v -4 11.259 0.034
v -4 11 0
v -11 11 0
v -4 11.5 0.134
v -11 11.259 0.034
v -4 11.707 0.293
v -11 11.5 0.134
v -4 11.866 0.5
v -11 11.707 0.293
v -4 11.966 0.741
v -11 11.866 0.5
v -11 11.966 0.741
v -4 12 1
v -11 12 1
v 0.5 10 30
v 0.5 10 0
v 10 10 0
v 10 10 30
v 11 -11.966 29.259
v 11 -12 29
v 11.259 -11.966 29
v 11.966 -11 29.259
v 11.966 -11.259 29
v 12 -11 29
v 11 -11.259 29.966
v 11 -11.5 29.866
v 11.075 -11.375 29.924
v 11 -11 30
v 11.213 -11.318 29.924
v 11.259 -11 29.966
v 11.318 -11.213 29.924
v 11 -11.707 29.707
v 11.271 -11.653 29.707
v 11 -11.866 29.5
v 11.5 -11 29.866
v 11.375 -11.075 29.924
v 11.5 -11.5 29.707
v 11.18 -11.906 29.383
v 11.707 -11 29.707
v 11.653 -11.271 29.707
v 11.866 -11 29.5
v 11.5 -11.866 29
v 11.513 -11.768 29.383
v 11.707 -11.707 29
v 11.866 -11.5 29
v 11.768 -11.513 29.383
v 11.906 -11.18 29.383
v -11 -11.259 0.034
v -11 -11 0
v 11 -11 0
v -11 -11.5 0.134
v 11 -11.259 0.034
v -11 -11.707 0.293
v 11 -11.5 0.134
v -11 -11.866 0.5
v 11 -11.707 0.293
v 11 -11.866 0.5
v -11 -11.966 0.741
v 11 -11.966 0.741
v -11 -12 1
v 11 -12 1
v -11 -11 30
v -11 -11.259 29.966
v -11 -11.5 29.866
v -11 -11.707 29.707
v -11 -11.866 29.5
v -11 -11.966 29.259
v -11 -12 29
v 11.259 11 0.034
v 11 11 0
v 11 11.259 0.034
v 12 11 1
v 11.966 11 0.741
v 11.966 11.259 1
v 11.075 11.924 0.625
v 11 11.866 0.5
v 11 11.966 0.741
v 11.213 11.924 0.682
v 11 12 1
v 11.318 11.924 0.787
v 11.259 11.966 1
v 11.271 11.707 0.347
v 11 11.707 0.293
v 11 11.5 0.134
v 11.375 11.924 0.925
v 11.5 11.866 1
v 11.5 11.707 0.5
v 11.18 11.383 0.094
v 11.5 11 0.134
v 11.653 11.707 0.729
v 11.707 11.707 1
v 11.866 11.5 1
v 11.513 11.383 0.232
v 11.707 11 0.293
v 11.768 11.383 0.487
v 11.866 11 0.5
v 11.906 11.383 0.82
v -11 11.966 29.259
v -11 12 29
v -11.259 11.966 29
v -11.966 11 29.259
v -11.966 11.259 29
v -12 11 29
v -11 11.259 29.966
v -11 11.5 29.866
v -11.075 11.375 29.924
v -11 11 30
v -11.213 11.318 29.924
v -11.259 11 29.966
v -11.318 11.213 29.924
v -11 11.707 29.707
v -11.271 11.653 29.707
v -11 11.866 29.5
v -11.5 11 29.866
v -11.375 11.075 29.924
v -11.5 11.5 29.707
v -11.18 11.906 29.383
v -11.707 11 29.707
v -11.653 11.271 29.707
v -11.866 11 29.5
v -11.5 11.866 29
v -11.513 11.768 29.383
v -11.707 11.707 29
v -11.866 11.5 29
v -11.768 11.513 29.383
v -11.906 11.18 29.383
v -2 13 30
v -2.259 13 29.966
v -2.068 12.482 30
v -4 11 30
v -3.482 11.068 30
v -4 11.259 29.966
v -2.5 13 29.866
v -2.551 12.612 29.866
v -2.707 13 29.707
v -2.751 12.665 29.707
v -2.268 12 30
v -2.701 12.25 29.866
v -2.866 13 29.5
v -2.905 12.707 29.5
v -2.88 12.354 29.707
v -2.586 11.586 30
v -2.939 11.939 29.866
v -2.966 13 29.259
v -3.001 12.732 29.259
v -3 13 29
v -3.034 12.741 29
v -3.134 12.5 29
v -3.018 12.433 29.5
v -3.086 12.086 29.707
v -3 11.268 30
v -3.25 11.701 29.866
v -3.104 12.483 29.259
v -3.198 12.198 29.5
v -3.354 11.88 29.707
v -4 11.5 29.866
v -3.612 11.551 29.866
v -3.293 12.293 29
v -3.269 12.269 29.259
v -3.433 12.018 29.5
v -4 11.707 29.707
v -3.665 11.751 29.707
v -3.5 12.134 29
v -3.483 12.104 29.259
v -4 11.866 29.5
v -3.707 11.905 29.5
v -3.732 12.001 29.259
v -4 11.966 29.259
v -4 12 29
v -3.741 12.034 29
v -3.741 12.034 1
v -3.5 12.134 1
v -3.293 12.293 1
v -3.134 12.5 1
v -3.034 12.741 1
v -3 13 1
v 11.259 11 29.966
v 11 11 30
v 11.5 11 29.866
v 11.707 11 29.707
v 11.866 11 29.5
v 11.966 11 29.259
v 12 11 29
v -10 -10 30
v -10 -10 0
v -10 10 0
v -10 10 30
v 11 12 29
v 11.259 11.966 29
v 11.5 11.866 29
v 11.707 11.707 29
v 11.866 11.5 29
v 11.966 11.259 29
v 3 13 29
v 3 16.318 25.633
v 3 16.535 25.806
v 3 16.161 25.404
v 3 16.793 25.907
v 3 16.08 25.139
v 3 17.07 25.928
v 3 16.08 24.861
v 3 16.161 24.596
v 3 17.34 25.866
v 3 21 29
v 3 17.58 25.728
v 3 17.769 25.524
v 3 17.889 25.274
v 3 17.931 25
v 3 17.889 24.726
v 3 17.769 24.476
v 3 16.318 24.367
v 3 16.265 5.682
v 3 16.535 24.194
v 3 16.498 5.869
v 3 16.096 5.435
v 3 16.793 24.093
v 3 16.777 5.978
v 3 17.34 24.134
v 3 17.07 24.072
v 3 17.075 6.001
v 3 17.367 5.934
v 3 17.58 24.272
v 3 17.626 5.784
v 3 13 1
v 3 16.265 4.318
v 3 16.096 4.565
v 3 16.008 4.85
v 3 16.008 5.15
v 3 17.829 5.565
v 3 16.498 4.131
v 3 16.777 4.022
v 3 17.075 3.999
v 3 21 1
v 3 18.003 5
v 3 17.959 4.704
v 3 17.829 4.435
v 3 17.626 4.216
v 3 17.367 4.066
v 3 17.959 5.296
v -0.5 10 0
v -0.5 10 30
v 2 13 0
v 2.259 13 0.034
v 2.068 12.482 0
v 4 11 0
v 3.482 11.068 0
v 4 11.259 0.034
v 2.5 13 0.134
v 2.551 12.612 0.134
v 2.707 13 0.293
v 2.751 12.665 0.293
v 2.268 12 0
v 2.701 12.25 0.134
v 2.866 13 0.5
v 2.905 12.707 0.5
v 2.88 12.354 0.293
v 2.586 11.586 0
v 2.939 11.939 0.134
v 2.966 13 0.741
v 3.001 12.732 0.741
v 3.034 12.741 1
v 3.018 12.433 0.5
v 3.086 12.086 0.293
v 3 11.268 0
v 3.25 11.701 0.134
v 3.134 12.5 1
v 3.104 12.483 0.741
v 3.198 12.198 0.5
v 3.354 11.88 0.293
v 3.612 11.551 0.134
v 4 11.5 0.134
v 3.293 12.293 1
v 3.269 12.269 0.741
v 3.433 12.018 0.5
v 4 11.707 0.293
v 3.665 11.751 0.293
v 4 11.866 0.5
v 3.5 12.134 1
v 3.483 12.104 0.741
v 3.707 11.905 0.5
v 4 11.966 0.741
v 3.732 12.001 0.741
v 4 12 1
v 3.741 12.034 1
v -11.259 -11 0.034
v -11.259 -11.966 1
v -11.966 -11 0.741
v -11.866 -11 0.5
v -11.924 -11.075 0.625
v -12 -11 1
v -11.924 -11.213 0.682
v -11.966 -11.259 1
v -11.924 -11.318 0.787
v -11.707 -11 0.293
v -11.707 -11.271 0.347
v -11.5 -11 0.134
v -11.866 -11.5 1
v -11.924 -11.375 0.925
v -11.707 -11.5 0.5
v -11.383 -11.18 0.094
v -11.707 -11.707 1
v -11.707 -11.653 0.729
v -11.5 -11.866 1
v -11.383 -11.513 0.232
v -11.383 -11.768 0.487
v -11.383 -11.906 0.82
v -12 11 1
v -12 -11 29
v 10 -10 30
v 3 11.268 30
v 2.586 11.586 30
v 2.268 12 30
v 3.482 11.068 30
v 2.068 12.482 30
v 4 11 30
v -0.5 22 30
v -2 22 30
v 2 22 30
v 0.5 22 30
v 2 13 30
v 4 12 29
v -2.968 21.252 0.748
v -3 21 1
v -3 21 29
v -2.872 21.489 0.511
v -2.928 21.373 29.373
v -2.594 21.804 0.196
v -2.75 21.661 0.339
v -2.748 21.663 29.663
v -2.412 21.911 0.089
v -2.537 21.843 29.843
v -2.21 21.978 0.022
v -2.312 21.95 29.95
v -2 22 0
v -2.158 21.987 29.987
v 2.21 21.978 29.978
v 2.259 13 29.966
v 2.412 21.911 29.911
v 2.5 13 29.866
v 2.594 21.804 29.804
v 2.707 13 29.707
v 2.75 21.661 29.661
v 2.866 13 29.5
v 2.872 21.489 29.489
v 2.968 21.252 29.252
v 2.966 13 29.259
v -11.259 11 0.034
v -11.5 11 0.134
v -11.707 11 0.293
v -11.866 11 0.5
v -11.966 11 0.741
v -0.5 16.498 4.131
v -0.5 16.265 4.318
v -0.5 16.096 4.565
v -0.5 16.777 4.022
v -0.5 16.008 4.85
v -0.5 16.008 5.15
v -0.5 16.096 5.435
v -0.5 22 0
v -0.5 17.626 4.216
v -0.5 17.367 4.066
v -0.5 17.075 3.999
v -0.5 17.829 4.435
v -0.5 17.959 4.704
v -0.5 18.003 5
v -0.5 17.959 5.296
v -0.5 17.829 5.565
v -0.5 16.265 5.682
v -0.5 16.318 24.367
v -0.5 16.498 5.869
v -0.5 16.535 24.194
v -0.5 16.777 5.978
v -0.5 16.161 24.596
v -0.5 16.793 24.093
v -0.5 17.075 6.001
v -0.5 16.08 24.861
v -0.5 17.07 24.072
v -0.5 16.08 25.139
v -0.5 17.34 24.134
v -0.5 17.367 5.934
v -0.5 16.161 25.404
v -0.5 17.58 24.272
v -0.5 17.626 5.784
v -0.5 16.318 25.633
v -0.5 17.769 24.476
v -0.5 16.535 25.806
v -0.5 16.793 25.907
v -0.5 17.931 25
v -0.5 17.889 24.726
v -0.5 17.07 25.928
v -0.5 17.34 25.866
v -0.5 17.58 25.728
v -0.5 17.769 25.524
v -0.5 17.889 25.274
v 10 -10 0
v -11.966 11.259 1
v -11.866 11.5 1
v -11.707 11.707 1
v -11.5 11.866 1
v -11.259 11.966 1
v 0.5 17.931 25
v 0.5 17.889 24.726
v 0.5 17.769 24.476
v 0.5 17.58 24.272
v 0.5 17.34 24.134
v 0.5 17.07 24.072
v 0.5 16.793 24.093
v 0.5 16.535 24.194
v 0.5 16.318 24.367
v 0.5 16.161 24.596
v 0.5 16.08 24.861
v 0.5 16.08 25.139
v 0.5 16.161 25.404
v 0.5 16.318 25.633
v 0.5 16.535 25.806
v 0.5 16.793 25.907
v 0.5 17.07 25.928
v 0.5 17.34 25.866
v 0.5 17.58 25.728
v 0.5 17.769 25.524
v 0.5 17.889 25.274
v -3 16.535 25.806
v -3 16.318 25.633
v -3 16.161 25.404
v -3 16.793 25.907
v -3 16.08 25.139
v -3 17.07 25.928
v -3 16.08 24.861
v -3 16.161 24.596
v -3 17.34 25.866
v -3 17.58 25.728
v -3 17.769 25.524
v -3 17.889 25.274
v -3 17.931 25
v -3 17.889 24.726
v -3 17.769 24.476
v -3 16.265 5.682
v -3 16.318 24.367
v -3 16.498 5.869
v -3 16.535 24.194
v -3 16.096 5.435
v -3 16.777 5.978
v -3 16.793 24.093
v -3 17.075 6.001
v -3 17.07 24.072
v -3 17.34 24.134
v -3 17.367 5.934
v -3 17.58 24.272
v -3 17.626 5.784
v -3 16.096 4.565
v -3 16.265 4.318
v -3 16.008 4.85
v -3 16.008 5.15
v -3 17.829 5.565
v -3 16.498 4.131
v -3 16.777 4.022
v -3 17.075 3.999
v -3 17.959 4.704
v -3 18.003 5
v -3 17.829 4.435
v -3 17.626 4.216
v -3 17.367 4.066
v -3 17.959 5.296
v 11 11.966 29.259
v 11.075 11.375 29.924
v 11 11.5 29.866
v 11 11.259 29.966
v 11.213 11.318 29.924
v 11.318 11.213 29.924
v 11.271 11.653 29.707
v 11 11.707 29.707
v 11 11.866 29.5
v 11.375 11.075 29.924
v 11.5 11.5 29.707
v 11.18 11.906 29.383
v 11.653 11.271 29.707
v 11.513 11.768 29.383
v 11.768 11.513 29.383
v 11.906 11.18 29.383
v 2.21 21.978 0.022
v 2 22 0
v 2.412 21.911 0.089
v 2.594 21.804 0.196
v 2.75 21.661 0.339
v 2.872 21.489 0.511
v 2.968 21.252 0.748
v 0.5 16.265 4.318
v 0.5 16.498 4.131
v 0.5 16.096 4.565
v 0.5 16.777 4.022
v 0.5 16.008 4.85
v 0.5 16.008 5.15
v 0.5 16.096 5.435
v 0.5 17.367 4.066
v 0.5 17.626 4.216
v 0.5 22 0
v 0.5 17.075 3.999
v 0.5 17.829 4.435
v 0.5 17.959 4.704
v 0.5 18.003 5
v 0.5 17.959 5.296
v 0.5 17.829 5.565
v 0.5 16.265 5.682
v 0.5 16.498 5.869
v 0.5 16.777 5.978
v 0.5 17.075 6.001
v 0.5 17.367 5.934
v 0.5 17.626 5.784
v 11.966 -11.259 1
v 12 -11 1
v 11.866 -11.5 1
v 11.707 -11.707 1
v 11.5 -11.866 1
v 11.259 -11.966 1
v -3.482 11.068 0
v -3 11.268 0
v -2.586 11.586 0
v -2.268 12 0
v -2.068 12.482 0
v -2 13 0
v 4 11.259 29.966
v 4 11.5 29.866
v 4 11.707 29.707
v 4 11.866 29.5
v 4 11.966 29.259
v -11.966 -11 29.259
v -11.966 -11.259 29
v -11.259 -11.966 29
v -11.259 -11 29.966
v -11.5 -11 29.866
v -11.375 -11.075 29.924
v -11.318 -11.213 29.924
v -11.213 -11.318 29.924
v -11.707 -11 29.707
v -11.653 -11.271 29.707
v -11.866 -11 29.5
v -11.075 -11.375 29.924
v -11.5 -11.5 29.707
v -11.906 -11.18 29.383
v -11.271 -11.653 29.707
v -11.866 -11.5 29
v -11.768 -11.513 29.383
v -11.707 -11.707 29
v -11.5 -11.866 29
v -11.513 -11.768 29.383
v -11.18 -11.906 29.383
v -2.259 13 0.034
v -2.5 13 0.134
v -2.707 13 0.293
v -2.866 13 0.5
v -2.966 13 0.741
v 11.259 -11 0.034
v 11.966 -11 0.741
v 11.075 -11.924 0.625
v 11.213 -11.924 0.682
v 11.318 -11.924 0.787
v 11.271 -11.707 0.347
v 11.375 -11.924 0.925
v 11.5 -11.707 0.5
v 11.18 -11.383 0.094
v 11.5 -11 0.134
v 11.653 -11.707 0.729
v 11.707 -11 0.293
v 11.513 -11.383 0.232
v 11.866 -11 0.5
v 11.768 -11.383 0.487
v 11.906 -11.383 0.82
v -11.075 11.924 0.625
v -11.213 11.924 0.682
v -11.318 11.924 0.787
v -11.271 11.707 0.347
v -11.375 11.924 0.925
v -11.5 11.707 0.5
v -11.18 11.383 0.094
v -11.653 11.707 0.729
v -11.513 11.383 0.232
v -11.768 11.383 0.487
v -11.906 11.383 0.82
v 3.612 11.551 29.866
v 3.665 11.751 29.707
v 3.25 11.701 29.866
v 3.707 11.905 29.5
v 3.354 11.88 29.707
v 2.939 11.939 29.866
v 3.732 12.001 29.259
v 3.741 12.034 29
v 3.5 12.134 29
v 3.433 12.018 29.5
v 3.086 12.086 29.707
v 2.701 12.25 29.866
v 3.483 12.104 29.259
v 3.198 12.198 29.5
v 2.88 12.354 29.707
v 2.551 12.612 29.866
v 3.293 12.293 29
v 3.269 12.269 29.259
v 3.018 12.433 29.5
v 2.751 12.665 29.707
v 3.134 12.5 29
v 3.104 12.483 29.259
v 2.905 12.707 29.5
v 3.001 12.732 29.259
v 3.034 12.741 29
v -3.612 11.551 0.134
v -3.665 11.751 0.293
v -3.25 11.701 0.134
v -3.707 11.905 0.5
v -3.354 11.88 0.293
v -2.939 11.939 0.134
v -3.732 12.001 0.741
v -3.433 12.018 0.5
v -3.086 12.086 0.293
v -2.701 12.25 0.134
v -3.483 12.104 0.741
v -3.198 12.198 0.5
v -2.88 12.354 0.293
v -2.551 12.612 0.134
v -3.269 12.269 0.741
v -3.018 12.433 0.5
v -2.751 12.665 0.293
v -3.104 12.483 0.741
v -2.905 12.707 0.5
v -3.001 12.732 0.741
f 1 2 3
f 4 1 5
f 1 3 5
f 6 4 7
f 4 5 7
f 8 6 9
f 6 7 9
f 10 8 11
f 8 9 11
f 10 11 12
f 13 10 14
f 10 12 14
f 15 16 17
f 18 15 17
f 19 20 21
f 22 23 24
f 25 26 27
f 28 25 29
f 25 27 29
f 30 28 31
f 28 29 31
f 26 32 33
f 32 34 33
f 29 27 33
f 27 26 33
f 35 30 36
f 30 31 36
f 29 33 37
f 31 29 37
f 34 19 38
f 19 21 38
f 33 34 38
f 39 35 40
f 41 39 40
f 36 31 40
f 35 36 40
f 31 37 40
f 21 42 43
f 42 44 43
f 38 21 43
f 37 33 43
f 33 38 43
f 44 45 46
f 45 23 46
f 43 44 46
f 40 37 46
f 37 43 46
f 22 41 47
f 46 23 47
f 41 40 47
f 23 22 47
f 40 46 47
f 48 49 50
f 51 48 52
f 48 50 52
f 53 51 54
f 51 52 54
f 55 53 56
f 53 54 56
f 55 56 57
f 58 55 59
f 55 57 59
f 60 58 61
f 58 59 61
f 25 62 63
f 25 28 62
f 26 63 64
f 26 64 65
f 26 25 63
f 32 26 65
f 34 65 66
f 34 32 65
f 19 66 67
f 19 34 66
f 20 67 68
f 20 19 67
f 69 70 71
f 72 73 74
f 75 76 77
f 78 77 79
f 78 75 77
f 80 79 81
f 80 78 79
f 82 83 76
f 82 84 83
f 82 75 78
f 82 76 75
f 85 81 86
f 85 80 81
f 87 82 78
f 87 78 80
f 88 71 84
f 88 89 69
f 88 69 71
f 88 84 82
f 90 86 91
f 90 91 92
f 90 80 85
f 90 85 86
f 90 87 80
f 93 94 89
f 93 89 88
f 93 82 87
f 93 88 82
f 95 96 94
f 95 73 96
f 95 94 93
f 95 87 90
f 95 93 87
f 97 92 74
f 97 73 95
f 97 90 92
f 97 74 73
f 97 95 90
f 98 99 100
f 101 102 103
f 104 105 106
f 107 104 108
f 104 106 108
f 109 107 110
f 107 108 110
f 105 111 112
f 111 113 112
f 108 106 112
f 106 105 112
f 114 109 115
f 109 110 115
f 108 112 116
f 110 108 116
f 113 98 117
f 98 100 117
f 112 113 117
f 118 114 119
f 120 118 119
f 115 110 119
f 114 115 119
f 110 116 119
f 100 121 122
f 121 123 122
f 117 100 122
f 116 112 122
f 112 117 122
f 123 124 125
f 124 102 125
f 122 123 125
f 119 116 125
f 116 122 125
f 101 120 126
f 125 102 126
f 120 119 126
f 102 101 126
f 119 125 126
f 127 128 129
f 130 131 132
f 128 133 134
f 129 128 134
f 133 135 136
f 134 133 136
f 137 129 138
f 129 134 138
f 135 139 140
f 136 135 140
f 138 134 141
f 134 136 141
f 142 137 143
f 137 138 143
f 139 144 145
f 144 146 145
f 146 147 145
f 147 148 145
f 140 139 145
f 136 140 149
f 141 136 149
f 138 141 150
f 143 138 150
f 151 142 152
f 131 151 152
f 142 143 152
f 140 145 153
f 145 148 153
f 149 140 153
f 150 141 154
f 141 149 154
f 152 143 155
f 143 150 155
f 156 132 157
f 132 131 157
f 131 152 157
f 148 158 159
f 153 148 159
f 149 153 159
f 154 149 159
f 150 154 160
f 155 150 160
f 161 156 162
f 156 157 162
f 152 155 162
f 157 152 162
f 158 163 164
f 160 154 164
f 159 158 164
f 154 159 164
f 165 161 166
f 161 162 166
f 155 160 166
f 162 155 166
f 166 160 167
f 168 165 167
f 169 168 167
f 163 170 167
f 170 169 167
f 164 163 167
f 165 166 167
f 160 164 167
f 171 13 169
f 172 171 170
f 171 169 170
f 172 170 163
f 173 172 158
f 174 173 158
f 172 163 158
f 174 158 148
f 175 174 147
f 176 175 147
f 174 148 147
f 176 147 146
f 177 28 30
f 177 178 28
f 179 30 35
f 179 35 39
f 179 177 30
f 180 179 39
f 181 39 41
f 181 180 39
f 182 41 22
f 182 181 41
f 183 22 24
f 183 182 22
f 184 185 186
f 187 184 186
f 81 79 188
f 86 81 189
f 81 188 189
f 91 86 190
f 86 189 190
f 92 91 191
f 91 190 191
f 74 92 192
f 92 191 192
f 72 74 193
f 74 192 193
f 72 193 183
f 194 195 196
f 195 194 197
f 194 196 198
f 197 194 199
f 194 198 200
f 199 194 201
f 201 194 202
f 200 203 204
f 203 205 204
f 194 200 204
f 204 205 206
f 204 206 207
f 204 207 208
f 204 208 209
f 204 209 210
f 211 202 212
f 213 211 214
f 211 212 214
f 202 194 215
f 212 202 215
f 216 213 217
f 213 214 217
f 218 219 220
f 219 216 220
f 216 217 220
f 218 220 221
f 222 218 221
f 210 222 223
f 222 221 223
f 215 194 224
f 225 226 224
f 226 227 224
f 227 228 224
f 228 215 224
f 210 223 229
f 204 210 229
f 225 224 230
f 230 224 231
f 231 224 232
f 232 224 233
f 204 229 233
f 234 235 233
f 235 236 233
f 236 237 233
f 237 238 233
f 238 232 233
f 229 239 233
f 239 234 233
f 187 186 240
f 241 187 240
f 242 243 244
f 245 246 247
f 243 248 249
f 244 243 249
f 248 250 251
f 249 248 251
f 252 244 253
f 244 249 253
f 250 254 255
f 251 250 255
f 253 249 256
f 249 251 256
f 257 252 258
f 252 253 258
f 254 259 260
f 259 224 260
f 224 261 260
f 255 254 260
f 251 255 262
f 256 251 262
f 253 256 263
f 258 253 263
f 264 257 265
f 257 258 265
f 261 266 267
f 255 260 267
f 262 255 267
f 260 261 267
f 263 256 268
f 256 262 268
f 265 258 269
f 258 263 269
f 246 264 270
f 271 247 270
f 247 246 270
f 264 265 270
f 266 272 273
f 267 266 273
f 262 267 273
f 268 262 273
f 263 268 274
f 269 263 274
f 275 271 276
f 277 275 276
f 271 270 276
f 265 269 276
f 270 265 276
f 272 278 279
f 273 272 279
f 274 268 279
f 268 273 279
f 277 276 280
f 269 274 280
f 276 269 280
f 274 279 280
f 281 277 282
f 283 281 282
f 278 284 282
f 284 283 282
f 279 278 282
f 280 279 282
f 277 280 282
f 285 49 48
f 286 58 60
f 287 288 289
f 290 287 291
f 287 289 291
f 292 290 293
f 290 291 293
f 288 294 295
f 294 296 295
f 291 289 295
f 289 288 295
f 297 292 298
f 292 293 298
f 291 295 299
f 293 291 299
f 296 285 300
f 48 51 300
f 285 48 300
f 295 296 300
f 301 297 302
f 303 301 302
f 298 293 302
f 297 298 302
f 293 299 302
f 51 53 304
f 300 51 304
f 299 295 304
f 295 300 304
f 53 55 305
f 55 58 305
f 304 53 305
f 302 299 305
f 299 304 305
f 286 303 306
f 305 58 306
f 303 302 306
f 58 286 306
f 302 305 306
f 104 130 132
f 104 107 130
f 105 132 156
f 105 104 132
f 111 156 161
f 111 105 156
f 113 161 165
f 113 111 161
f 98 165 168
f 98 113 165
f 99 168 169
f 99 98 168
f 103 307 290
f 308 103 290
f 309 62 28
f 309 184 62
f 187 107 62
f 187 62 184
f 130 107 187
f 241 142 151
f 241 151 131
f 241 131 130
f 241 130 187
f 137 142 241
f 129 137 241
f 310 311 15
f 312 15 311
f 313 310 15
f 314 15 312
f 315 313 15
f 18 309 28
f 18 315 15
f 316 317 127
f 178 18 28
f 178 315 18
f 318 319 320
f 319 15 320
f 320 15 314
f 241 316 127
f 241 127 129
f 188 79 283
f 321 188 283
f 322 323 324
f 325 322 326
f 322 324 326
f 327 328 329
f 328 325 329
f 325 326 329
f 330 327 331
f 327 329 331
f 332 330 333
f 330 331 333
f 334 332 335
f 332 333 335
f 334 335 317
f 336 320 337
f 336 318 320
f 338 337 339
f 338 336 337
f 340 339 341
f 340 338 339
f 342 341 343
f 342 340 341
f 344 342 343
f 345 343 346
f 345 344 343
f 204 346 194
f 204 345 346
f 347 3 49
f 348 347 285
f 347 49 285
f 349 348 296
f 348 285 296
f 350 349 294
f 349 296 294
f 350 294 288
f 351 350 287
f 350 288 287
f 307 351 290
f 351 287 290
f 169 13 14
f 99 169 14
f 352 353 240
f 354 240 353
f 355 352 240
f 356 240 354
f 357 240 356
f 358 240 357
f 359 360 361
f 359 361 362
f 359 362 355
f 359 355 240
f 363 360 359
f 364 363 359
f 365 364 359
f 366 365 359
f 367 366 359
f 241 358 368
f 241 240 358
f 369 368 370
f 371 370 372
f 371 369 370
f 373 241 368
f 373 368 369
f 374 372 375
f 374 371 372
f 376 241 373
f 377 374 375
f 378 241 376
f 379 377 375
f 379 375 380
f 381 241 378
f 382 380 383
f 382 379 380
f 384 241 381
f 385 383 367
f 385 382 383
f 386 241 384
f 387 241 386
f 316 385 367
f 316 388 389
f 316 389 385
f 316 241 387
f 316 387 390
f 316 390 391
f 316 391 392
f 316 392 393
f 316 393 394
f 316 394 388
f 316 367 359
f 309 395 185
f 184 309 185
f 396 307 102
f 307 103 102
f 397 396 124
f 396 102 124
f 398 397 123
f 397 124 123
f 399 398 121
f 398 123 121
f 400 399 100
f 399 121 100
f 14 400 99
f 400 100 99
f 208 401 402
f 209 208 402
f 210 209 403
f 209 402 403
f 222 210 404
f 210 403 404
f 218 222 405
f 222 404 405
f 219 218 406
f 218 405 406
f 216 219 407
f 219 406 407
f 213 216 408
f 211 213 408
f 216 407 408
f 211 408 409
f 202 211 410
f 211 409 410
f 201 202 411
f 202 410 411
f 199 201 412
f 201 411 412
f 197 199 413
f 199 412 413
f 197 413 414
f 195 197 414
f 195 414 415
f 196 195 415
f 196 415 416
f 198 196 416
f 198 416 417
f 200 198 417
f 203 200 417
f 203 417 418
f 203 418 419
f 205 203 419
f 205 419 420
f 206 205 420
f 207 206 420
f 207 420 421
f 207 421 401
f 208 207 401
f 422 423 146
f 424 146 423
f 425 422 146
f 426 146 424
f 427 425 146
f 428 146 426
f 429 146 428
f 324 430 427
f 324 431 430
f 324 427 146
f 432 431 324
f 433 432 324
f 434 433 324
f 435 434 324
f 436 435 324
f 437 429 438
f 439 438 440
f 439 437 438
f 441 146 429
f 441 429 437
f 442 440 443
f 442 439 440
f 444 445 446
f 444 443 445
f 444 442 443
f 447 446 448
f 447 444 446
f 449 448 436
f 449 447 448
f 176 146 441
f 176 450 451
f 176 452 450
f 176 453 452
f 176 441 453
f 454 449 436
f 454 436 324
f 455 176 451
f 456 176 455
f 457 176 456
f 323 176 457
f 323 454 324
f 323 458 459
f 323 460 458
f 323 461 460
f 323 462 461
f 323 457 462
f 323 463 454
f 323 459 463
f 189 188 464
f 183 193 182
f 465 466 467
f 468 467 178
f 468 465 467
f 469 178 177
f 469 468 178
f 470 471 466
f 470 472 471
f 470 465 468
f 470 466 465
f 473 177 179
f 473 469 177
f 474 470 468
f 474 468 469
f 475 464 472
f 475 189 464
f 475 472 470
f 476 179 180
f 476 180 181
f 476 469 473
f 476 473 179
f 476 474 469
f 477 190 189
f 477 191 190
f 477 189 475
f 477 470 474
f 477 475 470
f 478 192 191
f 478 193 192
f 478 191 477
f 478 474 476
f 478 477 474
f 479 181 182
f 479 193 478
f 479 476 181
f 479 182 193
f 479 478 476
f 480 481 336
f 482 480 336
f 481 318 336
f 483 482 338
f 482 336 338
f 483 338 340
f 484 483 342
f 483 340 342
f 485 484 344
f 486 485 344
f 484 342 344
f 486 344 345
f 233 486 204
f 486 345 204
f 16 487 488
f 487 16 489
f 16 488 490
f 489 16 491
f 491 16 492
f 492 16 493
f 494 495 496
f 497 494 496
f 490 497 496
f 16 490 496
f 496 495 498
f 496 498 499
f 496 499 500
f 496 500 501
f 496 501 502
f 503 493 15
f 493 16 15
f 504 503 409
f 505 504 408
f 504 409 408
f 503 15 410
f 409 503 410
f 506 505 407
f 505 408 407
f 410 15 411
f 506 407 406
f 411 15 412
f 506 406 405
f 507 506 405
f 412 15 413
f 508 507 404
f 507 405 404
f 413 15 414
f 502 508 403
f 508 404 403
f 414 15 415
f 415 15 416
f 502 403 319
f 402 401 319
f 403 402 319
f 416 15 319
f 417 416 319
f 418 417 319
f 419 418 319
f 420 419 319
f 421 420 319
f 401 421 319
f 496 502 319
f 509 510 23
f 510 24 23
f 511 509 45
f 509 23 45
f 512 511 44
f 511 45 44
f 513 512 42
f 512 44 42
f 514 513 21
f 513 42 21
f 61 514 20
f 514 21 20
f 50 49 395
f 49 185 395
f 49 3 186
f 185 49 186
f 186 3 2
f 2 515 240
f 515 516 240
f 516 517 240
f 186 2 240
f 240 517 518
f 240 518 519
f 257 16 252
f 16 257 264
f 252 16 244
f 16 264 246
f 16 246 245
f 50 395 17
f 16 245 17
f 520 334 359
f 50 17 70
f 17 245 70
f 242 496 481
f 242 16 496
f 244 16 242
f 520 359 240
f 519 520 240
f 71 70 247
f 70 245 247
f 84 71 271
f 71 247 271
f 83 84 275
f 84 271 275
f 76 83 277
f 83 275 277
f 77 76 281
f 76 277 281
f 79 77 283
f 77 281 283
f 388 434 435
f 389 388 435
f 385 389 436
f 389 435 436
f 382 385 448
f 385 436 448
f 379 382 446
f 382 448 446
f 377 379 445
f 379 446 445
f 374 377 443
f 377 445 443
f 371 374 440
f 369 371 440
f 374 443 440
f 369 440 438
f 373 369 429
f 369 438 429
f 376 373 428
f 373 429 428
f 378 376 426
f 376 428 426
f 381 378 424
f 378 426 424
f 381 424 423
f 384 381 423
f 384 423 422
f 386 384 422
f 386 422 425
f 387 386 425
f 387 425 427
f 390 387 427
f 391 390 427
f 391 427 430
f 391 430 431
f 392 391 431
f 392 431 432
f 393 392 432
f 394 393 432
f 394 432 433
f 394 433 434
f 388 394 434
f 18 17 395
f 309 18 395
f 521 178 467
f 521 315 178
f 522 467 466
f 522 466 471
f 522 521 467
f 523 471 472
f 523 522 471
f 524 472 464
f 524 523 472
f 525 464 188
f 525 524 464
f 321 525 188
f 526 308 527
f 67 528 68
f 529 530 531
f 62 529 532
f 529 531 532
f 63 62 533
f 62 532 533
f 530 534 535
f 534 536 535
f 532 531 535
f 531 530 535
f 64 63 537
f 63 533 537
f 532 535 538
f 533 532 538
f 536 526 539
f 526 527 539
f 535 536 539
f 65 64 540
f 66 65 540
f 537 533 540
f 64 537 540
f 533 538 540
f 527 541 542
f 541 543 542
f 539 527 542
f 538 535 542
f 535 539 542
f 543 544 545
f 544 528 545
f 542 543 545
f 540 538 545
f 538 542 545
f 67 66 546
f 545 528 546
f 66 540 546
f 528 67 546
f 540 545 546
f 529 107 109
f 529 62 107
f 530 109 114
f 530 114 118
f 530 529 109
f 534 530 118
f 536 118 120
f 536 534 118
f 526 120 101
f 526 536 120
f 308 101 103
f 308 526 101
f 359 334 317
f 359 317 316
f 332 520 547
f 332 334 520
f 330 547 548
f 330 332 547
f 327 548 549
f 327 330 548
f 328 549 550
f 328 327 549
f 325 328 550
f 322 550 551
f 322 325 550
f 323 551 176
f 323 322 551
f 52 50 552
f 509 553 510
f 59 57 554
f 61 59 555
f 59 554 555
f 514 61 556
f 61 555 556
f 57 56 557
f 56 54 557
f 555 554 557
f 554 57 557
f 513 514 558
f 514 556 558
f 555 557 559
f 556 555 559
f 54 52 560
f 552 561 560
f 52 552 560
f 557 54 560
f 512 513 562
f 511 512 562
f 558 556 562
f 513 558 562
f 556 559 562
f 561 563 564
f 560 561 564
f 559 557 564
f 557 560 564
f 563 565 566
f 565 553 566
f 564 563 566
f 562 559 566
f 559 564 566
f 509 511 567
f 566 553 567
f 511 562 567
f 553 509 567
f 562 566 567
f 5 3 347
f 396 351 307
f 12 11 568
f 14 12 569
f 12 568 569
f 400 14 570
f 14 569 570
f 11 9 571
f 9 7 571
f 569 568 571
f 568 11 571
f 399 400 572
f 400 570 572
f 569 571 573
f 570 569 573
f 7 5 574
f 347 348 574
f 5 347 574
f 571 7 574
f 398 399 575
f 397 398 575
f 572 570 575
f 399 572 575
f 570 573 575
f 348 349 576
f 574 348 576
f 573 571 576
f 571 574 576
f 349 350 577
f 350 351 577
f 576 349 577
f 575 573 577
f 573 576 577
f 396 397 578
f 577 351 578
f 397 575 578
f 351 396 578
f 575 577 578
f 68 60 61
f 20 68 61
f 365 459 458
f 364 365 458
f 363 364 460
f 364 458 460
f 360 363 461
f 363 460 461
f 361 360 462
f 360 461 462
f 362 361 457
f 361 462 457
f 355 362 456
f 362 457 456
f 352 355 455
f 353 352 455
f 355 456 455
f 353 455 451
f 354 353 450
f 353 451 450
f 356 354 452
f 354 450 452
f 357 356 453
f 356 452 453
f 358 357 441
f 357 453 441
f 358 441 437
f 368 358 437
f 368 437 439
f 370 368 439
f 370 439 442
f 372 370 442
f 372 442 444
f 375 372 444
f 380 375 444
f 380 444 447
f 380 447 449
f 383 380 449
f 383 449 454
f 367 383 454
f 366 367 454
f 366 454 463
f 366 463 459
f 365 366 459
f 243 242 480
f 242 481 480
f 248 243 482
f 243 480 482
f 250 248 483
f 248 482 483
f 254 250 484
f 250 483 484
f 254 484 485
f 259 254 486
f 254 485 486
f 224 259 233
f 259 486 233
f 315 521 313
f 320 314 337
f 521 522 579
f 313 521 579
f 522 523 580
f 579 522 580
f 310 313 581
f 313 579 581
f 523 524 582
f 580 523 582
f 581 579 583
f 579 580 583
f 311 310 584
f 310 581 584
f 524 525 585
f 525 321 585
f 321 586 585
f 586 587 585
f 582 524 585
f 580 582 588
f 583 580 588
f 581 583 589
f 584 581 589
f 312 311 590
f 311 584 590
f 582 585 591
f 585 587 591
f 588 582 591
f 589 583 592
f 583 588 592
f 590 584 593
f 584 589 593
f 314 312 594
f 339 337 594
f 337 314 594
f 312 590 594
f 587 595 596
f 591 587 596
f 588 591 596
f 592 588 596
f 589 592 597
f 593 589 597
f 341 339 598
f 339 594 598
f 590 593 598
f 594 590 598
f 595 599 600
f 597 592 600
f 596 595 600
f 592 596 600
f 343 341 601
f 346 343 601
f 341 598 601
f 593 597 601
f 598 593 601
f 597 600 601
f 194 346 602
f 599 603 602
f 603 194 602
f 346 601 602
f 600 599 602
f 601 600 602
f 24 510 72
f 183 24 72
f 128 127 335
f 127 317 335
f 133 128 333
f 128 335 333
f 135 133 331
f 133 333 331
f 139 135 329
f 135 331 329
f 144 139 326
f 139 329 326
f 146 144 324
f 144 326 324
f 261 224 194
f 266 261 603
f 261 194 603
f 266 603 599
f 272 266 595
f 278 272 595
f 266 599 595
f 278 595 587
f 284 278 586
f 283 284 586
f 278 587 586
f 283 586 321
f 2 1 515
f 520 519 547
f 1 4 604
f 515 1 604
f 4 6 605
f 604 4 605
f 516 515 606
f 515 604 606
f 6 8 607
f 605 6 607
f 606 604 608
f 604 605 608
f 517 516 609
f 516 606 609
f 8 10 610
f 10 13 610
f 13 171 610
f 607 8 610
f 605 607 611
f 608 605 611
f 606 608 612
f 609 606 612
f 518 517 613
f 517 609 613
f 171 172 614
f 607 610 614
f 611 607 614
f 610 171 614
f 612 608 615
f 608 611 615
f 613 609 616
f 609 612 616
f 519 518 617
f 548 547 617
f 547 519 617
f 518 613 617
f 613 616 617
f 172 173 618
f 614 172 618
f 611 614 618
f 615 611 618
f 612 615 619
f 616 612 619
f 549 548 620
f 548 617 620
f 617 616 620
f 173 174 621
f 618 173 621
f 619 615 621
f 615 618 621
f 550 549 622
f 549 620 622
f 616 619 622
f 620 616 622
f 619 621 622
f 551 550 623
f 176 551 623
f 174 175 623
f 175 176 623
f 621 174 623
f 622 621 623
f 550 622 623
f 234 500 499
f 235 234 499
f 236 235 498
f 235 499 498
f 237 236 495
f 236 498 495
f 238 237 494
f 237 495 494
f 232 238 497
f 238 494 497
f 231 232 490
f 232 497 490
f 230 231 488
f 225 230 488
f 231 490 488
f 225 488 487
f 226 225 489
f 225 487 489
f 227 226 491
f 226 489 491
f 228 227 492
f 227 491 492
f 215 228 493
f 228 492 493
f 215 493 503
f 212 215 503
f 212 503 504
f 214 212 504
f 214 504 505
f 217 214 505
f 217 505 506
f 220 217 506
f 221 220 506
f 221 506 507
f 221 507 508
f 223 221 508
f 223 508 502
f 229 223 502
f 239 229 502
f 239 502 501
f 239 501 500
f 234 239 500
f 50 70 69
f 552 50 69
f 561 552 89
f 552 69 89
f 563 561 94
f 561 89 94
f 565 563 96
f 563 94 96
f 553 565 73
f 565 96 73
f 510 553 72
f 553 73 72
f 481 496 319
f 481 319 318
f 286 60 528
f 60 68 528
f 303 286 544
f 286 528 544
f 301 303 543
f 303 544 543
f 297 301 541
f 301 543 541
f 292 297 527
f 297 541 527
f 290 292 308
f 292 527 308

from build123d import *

# Parameters (mm, degrees)
SKETCH_1_W          = 6
SKETCH_1_H          = 2
SKETCH_1_H_2        = 10
EXTRUDE_1_DEPTH     = 30
SKETCH_2_W          = 1
SKETCH_2_H          = 17.803492696
CUT_EXTRUDE_1_DEPTH = 30
SKETCH_3_R          = 1.003337712
SKETCH_3_R_2        = 0.930822741
CUT_EXTRUDE_2_DEPTH = 30
FILLET_1_R          = 1


with BuildPart() as part:
    # 草图1 → 凸台-拉伸1 (new body)
    with BuildSketch(Plane.XY):
        with Locations((0, 11)):
            Rectangle(SKETCH_1_W, SKETCH_1_H)
        Polygon((-10, -10), (-10, 10), (-3, 10), (-3, 12), (-12, 12), (-12, -12), (12, -12), (12, 12), (3, 12), (3, 10), (10, 10), (10, -10), align=None)
        with Locations((0, 17)):
            Rectangle(SKETCH_1_W, SKETCH_1_H_2)
    extrude(amount=EXTRUDE_1_DEPTH)

    # 草图2 → 切除-拉伸1 (cut)
    with BuildSketch(Plane.XY.offset(30)):
        with Locations((0, 18.381427763)):
            Rectangle(SKETCH_2_W, SKETCH_2_H)
    extrude(amount=-CUT_EXTRUDE_1_DEPTH, mode=Mode.SUBTRACT)

    # 草图3 → 切除-拉伸2 (cut)
    with BuildSketch(Plane.ZY.offset(3)):
        with Locations(Location((5, 17, 0), (0, 0, 90))):
            Circle(SKETCH_3_R)
        with Locations(Location((25, 17, 0), (0, 0, 90))):
            Circle(SKETCH_3_R_2)
    extrude(amount=-CUT_EXTRUDE_2_DEPTH, mode=Mode.SUBTRACT)

    # 圆角1
    fillet_1_edges = [part.edges().sort_by_distance(p)[0] for p in [
        (12, 0, 0),
        (0, -12, 0),
        (-12, 0, 0),
        (-7.5, 12, 0),
        (-3, 17, 0),
        (3, 17, 0),
        (7.5, 12, 0),
        (12, 12, 15),
        (12, -12, 15),
        (-12, -12, 15),
        (-12, 12, 15),
        (-3, 12, 15),
        (-3, 22, 15),
        (3, 22, 15),
        (3, 12, 15),
        (7.5, 12, 30),
        (3, 17, 30),
        (-3, 17, 30),
        (-7.5, 12, 30),
        (-12, 0, 30),
        (0, -12, 30),
        (12, 0, 30),
    ]]
    fillet(fillet_1_edges, radius=FILLET_1_R)


solid = part.part
